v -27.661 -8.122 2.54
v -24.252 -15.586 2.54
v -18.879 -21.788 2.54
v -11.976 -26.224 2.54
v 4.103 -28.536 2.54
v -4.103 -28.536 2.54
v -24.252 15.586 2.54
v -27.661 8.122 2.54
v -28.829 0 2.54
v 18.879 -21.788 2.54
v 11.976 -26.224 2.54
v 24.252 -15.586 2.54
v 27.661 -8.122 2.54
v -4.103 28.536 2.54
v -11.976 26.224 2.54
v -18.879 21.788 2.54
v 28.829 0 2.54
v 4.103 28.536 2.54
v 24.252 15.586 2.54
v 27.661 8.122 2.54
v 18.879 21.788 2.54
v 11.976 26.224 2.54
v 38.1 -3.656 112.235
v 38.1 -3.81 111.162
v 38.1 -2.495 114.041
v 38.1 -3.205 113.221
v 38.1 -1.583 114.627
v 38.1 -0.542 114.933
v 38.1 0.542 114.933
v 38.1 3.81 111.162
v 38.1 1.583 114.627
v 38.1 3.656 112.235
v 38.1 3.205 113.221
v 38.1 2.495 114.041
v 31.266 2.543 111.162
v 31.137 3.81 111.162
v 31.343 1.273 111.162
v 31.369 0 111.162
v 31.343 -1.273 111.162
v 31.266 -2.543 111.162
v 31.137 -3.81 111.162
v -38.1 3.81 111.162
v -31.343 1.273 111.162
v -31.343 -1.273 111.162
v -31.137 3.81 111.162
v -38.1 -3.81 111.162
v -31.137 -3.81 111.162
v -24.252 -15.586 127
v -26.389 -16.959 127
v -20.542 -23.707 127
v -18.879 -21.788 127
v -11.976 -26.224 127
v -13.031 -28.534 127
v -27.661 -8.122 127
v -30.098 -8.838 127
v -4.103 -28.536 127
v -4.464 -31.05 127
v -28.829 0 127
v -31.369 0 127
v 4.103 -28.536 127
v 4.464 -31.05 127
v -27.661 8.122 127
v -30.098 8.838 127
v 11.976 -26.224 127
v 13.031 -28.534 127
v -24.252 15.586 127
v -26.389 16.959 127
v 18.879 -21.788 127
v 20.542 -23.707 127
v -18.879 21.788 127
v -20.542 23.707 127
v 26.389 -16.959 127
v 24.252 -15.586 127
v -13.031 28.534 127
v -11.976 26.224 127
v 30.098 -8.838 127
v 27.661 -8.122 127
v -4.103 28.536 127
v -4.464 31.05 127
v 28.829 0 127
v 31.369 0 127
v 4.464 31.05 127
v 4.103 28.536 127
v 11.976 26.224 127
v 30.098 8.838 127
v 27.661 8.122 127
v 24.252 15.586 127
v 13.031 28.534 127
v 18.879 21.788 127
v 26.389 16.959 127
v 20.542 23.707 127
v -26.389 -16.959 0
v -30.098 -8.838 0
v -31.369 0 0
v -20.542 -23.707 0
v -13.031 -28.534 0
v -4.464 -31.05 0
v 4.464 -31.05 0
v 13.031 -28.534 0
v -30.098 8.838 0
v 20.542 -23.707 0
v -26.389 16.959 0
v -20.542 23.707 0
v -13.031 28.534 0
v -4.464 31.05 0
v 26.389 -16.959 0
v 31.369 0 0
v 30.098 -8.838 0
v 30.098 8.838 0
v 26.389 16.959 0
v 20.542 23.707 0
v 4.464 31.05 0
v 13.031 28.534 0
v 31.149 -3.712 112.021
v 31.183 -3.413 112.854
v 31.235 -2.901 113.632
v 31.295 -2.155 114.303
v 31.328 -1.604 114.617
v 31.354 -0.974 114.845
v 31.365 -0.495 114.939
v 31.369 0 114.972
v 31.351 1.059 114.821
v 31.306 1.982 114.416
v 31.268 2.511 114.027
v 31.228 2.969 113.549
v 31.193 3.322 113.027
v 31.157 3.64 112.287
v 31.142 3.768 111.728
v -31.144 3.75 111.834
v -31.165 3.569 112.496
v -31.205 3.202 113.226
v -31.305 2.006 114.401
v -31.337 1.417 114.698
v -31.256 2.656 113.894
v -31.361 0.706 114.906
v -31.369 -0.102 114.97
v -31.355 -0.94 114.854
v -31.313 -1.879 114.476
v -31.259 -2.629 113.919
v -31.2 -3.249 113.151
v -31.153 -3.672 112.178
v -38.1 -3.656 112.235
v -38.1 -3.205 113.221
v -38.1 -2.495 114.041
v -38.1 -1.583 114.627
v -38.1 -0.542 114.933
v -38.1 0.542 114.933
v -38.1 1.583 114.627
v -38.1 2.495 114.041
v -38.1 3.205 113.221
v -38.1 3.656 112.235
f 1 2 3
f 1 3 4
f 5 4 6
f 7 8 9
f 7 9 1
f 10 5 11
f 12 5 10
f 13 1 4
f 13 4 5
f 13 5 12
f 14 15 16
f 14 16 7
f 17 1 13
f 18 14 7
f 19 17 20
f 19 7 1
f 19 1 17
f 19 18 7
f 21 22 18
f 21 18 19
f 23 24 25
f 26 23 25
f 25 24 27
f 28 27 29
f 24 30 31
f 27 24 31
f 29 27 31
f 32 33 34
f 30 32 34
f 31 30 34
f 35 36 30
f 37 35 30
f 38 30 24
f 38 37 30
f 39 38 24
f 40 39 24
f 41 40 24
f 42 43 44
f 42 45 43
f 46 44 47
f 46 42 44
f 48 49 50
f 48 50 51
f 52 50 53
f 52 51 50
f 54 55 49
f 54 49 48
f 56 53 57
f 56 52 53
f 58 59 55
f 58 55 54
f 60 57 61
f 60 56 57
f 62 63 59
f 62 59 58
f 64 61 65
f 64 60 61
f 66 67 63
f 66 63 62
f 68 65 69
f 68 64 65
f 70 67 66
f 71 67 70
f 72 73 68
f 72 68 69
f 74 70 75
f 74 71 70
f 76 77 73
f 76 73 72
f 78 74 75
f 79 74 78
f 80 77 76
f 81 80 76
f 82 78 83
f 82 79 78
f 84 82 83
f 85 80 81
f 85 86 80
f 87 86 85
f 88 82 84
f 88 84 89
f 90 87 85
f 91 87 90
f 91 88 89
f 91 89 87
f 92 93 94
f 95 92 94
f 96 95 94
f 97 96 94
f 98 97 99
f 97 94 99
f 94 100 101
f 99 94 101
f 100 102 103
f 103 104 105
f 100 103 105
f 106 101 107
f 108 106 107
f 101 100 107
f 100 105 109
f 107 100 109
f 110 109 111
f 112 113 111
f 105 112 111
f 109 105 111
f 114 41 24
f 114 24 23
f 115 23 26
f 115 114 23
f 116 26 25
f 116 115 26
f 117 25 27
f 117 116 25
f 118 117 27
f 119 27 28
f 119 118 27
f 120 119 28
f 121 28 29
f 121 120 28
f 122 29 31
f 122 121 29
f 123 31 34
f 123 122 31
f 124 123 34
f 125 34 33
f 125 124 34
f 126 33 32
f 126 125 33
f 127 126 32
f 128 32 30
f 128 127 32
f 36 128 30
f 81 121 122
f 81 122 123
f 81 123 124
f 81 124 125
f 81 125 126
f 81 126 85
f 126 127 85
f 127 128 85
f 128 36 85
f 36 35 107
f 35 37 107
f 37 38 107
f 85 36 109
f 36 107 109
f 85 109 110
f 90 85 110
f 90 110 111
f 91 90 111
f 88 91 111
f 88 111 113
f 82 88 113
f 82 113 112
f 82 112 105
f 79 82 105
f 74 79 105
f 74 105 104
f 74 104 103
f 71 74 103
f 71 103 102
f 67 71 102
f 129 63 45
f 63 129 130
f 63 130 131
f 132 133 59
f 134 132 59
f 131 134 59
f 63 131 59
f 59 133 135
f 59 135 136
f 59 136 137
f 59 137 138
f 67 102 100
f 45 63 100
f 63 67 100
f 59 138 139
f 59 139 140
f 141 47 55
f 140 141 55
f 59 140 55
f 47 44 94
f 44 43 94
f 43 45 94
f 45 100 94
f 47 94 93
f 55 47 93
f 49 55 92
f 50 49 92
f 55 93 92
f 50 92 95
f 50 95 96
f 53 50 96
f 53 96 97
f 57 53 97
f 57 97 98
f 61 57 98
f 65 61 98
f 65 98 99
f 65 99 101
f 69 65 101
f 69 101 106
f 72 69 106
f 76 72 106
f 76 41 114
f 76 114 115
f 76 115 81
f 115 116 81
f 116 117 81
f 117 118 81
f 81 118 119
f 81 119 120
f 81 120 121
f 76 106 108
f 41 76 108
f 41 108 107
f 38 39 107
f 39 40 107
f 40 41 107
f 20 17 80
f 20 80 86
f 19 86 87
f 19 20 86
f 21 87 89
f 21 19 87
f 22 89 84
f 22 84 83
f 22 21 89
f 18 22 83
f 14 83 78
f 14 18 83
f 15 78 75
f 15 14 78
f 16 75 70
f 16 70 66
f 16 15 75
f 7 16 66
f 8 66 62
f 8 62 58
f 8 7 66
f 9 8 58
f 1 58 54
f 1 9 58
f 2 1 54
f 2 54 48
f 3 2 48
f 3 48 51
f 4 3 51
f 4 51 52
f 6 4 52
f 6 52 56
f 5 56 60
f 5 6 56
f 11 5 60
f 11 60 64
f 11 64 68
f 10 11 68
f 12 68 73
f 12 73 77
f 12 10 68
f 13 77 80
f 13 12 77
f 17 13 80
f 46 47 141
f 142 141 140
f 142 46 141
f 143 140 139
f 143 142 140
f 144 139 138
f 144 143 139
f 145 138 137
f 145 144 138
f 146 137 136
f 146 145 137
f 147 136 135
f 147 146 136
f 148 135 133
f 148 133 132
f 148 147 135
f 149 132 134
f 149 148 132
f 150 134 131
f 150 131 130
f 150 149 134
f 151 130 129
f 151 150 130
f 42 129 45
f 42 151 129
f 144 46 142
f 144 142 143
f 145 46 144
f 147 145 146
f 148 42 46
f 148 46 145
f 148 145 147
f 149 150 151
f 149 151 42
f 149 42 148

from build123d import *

# Parameters (mm, degrees)
SKETCH1_R                = 31.369
BOSS_EXTRUDE1_DEPTH      = 127
BOSS_EXTRUDE2_DEPTH      = 38.1
BOSS_EXTRUDE2_DEPTH_BACK = 38.1
SHELL3_START             = 2.54
SHELL3_OUTLINE_R         = 28.829
SHELL3_DEPTH             = 124.46


# Read off the part's stored shape, not the designer's step: Shell3
with BuildPart() as part:
    # Sketch1 → Boss-Extrude1 (new body)
    with BuildSketch(Plane.XY):
        Circle(SKETCH1_R)
    extrude(amount=BOSS_EXTRUDE1_DEPTH)

    # Sketch2 → Boss-Extrude2 (add, two sides: drawn at the far end of the back side and taken through both)
    with BuildSketch(Plane(origin=(0, 0, 0), x_dir=(0, 0, -1), z_dir=(1, 0, 0)).offset(-BOSS_EXTRUDE2_DEPTH_BACK)):
        with BuildLine():
            Line((-111.161571782, 3.81), (-111.161571782, -3.81))
            ThreePointArc((-111.161571782, -3.81), (-114.971571782, 0), (-111.161571782, 3.81))
        make_face()
    extrude(amount=BOSS_EXTRUDE2_DEPTH + BOSS_EXTRUDE2_DEPTH_BACK)

    # Shell3 outline → Shell3 (cut)
    with BuildSketch(Plane.XY.offset(SHELL3_START)):
        Circle(SHELL3_OUTLINE_R)
    extrude(amount=SHELL3_DEPTH, mode=Mode.SUBTRACT)


solid = part.part
